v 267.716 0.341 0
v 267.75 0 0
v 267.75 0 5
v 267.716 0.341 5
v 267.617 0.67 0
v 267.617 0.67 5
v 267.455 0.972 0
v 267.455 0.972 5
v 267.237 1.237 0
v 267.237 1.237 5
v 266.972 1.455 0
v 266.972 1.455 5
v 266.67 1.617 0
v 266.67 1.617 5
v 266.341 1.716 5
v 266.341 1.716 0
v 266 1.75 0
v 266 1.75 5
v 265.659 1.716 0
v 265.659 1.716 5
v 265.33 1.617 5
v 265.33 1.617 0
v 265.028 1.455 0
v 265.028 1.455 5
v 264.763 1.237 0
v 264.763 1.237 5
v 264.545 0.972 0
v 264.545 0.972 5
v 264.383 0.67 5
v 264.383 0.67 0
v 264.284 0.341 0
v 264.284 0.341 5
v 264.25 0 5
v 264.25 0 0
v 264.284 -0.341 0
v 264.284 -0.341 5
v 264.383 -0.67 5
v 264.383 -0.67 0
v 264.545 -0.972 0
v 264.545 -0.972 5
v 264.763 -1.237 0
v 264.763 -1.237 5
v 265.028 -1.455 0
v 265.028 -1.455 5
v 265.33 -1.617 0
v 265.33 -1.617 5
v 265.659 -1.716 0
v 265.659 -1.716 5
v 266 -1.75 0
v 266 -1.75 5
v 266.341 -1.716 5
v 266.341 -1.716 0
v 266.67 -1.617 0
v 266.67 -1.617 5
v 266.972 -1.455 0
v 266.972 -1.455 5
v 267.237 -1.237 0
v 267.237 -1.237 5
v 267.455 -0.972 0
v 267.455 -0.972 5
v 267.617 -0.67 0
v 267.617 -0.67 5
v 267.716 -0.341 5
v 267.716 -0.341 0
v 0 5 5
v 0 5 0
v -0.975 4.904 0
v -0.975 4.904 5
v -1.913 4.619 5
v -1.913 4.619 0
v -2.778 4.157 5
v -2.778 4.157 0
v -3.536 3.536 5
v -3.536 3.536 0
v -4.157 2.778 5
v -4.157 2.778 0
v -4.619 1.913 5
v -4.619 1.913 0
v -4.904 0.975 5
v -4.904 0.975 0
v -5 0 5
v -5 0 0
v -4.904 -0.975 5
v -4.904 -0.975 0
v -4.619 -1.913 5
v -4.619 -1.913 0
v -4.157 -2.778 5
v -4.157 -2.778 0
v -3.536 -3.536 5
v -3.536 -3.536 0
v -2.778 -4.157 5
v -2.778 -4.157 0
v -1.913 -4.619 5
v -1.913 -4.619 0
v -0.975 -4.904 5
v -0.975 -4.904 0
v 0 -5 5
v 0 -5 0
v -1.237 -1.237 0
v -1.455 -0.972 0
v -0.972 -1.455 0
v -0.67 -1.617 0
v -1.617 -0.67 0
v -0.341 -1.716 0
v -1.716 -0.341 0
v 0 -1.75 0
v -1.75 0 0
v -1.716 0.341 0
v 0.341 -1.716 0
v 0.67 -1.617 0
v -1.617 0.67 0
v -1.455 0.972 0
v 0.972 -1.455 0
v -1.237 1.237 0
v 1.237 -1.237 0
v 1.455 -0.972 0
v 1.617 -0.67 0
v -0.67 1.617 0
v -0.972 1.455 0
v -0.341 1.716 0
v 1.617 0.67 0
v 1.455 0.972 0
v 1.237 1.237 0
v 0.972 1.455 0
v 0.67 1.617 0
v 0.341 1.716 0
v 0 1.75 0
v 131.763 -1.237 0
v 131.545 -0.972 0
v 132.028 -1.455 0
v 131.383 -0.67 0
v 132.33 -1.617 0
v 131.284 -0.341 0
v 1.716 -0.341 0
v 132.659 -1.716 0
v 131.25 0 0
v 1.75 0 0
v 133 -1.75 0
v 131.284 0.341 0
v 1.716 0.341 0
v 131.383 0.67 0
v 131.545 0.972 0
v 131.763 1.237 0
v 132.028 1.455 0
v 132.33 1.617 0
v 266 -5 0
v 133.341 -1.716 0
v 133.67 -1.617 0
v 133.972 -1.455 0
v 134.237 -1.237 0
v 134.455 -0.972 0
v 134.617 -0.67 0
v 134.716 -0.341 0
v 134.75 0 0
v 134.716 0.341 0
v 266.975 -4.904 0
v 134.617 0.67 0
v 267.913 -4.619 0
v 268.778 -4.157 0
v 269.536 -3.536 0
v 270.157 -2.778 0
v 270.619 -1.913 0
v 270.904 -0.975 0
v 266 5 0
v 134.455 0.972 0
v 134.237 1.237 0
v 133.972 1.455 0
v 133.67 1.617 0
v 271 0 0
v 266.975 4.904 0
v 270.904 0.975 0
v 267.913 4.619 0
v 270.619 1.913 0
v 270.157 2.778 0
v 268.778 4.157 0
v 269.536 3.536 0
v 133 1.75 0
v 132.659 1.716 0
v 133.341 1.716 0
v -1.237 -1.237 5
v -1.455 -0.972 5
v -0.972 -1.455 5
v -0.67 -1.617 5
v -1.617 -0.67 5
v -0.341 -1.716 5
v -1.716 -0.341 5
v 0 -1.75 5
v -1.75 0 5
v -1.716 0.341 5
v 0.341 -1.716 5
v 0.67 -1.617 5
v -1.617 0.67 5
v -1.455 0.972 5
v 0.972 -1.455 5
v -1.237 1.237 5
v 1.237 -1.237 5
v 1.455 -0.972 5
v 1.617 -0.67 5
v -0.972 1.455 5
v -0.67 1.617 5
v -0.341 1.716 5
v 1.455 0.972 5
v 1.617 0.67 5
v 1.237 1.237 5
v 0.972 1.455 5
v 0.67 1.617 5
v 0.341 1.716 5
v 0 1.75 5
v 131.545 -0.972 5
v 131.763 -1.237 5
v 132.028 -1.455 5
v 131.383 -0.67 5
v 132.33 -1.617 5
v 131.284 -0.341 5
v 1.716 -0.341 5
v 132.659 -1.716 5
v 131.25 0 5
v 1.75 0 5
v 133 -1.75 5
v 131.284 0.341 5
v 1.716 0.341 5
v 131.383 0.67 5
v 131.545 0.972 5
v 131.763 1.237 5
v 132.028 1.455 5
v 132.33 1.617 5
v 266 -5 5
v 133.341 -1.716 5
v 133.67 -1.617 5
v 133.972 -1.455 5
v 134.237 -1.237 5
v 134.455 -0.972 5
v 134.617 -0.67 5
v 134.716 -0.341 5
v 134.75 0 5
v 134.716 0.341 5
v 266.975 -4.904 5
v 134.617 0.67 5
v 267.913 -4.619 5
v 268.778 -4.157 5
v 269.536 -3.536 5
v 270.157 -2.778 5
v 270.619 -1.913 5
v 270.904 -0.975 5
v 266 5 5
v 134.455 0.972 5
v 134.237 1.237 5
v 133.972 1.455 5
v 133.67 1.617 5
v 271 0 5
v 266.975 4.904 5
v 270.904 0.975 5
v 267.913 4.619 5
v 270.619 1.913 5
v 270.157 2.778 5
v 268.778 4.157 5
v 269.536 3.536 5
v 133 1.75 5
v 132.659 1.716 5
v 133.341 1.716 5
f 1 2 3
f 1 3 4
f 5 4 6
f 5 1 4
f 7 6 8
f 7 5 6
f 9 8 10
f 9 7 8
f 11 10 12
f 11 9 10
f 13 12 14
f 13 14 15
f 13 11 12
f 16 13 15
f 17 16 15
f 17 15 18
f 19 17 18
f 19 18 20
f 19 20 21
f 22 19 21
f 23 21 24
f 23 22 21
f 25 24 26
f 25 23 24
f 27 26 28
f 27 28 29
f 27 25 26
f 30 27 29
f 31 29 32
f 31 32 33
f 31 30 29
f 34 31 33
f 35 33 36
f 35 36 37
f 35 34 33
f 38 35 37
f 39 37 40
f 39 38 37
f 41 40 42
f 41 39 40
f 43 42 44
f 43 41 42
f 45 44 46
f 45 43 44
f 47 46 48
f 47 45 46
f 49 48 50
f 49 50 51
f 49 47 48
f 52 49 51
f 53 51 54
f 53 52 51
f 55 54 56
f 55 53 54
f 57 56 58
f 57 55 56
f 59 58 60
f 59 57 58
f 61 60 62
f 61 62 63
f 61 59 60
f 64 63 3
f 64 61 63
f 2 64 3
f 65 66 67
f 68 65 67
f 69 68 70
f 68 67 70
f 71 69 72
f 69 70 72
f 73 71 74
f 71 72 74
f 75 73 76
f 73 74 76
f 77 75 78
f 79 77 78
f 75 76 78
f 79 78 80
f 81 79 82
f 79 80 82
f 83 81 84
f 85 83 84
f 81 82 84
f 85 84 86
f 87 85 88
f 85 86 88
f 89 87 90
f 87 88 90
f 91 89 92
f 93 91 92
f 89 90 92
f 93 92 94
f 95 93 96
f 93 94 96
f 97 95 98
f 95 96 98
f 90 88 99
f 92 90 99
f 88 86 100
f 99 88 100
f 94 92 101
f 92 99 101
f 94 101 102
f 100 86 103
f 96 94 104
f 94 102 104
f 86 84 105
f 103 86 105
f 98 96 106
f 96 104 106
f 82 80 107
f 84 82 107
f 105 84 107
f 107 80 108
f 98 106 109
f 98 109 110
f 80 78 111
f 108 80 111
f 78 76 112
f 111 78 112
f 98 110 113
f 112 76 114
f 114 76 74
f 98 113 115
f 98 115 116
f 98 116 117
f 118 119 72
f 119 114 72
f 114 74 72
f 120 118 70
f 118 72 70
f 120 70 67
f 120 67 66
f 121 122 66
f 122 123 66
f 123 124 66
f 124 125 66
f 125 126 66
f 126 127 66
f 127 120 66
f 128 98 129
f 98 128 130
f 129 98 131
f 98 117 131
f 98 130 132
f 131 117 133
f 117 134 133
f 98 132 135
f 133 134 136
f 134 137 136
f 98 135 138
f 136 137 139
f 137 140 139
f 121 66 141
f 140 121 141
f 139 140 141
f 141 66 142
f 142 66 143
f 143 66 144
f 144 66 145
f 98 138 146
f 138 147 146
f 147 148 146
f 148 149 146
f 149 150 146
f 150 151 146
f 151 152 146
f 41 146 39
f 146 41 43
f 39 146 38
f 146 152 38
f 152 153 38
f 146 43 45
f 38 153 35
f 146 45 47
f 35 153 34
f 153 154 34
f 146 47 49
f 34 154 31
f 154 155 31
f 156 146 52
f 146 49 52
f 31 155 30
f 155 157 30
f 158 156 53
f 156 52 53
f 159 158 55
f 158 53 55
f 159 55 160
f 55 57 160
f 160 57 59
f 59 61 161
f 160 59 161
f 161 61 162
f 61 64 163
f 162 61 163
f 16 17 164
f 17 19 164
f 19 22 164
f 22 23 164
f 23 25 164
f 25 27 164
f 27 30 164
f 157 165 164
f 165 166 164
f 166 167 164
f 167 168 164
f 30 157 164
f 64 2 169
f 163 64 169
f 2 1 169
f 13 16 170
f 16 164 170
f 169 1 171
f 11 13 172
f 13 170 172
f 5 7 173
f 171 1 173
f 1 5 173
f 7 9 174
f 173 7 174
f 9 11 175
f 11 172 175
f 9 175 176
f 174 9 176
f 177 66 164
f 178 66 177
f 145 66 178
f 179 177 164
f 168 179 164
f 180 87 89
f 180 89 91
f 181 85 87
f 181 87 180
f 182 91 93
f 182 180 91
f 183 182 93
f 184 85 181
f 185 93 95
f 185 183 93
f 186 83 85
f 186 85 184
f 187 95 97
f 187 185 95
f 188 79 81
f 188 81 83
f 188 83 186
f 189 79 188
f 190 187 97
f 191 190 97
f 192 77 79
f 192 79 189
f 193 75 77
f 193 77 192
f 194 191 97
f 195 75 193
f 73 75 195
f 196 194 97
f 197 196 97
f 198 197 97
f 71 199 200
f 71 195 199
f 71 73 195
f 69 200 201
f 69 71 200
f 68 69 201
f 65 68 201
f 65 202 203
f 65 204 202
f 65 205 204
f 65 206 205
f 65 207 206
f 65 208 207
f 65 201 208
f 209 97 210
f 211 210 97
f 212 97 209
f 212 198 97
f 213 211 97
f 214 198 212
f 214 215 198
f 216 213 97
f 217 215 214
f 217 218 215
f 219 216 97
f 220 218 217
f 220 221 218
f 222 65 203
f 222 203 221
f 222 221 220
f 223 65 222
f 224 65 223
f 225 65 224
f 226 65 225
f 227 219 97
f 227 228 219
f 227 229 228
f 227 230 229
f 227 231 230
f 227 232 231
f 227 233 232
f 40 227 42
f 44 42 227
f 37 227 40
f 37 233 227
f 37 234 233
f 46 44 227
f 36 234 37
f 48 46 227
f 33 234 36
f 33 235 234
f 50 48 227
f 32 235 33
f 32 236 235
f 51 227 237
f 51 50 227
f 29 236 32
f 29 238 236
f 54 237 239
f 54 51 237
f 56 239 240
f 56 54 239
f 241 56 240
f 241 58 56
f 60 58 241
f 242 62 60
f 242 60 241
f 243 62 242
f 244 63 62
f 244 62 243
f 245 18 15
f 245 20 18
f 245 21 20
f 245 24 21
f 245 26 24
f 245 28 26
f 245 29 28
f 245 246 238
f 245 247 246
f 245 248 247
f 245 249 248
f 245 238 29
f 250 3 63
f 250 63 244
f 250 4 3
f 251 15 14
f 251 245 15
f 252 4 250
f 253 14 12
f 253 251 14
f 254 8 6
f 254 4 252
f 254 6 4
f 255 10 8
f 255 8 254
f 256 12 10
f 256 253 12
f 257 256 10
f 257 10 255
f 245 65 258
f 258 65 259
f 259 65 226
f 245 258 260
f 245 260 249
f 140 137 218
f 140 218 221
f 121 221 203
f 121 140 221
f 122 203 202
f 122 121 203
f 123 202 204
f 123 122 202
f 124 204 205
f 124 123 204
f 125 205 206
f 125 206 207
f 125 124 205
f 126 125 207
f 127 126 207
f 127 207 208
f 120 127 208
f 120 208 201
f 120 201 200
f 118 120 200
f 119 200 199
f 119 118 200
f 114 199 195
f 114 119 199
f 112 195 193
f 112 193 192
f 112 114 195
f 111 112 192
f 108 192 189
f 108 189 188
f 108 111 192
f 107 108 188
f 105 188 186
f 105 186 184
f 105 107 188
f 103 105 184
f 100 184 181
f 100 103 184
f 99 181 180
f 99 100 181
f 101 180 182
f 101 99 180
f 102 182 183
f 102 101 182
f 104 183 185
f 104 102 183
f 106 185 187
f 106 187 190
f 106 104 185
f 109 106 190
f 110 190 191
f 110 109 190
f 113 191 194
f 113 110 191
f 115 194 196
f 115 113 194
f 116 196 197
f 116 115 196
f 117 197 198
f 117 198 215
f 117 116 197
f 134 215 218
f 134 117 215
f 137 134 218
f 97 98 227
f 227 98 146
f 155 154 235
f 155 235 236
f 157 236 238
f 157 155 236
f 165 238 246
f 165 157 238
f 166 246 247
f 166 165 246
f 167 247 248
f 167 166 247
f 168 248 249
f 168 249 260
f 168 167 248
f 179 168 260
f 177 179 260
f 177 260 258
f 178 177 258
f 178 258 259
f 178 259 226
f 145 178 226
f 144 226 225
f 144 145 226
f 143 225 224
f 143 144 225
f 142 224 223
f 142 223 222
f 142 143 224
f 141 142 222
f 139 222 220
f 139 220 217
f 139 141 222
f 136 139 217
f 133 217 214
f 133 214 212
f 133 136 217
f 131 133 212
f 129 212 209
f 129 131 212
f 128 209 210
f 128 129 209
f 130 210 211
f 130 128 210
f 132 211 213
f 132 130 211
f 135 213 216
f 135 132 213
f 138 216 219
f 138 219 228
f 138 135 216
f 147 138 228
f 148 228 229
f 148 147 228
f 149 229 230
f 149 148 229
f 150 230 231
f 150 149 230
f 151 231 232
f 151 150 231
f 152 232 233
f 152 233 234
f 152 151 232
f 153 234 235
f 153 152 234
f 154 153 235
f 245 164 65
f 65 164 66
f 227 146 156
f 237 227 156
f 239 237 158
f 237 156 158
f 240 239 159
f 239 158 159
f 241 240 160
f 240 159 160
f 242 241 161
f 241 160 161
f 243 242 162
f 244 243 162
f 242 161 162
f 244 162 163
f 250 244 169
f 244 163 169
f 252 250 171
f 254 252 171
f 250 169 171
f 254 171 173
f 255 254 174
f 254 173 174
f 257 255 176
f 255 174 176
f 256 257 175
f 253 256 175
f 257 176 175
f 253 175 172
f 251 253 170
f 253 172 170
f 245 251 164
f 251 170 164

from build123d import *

# Parameters (mm, degrees)
SKETCH_R  = 1.75
PAD_DEPTH = 5


with BuildPart() as part:
    # Sketch → Pad (new body)
    with BuildSketch(Plane.XY):
        with BuildLine():
            ThreePointArc((0, 5), (-5, 0), (0, -5))
            Line((0, -5), (266, -5))
            ThreePointArc((266, -5), (271, 0), (266, 5))
            Line((266, 5), (0, 5))
        make_face()
        Circle(SKETCH_R, mode=Mode.SUBTRACT)
        with Locations((266, 0)):
            Circle(SKETCH_R, mode=Mode.SUBTRACT)
        with Locations((133, 0)):
            Circle(SKETCH_R, mode=Mode.SUBTRACT)
    extrude(amount=PAD_DEPTH)


solid = part.part
